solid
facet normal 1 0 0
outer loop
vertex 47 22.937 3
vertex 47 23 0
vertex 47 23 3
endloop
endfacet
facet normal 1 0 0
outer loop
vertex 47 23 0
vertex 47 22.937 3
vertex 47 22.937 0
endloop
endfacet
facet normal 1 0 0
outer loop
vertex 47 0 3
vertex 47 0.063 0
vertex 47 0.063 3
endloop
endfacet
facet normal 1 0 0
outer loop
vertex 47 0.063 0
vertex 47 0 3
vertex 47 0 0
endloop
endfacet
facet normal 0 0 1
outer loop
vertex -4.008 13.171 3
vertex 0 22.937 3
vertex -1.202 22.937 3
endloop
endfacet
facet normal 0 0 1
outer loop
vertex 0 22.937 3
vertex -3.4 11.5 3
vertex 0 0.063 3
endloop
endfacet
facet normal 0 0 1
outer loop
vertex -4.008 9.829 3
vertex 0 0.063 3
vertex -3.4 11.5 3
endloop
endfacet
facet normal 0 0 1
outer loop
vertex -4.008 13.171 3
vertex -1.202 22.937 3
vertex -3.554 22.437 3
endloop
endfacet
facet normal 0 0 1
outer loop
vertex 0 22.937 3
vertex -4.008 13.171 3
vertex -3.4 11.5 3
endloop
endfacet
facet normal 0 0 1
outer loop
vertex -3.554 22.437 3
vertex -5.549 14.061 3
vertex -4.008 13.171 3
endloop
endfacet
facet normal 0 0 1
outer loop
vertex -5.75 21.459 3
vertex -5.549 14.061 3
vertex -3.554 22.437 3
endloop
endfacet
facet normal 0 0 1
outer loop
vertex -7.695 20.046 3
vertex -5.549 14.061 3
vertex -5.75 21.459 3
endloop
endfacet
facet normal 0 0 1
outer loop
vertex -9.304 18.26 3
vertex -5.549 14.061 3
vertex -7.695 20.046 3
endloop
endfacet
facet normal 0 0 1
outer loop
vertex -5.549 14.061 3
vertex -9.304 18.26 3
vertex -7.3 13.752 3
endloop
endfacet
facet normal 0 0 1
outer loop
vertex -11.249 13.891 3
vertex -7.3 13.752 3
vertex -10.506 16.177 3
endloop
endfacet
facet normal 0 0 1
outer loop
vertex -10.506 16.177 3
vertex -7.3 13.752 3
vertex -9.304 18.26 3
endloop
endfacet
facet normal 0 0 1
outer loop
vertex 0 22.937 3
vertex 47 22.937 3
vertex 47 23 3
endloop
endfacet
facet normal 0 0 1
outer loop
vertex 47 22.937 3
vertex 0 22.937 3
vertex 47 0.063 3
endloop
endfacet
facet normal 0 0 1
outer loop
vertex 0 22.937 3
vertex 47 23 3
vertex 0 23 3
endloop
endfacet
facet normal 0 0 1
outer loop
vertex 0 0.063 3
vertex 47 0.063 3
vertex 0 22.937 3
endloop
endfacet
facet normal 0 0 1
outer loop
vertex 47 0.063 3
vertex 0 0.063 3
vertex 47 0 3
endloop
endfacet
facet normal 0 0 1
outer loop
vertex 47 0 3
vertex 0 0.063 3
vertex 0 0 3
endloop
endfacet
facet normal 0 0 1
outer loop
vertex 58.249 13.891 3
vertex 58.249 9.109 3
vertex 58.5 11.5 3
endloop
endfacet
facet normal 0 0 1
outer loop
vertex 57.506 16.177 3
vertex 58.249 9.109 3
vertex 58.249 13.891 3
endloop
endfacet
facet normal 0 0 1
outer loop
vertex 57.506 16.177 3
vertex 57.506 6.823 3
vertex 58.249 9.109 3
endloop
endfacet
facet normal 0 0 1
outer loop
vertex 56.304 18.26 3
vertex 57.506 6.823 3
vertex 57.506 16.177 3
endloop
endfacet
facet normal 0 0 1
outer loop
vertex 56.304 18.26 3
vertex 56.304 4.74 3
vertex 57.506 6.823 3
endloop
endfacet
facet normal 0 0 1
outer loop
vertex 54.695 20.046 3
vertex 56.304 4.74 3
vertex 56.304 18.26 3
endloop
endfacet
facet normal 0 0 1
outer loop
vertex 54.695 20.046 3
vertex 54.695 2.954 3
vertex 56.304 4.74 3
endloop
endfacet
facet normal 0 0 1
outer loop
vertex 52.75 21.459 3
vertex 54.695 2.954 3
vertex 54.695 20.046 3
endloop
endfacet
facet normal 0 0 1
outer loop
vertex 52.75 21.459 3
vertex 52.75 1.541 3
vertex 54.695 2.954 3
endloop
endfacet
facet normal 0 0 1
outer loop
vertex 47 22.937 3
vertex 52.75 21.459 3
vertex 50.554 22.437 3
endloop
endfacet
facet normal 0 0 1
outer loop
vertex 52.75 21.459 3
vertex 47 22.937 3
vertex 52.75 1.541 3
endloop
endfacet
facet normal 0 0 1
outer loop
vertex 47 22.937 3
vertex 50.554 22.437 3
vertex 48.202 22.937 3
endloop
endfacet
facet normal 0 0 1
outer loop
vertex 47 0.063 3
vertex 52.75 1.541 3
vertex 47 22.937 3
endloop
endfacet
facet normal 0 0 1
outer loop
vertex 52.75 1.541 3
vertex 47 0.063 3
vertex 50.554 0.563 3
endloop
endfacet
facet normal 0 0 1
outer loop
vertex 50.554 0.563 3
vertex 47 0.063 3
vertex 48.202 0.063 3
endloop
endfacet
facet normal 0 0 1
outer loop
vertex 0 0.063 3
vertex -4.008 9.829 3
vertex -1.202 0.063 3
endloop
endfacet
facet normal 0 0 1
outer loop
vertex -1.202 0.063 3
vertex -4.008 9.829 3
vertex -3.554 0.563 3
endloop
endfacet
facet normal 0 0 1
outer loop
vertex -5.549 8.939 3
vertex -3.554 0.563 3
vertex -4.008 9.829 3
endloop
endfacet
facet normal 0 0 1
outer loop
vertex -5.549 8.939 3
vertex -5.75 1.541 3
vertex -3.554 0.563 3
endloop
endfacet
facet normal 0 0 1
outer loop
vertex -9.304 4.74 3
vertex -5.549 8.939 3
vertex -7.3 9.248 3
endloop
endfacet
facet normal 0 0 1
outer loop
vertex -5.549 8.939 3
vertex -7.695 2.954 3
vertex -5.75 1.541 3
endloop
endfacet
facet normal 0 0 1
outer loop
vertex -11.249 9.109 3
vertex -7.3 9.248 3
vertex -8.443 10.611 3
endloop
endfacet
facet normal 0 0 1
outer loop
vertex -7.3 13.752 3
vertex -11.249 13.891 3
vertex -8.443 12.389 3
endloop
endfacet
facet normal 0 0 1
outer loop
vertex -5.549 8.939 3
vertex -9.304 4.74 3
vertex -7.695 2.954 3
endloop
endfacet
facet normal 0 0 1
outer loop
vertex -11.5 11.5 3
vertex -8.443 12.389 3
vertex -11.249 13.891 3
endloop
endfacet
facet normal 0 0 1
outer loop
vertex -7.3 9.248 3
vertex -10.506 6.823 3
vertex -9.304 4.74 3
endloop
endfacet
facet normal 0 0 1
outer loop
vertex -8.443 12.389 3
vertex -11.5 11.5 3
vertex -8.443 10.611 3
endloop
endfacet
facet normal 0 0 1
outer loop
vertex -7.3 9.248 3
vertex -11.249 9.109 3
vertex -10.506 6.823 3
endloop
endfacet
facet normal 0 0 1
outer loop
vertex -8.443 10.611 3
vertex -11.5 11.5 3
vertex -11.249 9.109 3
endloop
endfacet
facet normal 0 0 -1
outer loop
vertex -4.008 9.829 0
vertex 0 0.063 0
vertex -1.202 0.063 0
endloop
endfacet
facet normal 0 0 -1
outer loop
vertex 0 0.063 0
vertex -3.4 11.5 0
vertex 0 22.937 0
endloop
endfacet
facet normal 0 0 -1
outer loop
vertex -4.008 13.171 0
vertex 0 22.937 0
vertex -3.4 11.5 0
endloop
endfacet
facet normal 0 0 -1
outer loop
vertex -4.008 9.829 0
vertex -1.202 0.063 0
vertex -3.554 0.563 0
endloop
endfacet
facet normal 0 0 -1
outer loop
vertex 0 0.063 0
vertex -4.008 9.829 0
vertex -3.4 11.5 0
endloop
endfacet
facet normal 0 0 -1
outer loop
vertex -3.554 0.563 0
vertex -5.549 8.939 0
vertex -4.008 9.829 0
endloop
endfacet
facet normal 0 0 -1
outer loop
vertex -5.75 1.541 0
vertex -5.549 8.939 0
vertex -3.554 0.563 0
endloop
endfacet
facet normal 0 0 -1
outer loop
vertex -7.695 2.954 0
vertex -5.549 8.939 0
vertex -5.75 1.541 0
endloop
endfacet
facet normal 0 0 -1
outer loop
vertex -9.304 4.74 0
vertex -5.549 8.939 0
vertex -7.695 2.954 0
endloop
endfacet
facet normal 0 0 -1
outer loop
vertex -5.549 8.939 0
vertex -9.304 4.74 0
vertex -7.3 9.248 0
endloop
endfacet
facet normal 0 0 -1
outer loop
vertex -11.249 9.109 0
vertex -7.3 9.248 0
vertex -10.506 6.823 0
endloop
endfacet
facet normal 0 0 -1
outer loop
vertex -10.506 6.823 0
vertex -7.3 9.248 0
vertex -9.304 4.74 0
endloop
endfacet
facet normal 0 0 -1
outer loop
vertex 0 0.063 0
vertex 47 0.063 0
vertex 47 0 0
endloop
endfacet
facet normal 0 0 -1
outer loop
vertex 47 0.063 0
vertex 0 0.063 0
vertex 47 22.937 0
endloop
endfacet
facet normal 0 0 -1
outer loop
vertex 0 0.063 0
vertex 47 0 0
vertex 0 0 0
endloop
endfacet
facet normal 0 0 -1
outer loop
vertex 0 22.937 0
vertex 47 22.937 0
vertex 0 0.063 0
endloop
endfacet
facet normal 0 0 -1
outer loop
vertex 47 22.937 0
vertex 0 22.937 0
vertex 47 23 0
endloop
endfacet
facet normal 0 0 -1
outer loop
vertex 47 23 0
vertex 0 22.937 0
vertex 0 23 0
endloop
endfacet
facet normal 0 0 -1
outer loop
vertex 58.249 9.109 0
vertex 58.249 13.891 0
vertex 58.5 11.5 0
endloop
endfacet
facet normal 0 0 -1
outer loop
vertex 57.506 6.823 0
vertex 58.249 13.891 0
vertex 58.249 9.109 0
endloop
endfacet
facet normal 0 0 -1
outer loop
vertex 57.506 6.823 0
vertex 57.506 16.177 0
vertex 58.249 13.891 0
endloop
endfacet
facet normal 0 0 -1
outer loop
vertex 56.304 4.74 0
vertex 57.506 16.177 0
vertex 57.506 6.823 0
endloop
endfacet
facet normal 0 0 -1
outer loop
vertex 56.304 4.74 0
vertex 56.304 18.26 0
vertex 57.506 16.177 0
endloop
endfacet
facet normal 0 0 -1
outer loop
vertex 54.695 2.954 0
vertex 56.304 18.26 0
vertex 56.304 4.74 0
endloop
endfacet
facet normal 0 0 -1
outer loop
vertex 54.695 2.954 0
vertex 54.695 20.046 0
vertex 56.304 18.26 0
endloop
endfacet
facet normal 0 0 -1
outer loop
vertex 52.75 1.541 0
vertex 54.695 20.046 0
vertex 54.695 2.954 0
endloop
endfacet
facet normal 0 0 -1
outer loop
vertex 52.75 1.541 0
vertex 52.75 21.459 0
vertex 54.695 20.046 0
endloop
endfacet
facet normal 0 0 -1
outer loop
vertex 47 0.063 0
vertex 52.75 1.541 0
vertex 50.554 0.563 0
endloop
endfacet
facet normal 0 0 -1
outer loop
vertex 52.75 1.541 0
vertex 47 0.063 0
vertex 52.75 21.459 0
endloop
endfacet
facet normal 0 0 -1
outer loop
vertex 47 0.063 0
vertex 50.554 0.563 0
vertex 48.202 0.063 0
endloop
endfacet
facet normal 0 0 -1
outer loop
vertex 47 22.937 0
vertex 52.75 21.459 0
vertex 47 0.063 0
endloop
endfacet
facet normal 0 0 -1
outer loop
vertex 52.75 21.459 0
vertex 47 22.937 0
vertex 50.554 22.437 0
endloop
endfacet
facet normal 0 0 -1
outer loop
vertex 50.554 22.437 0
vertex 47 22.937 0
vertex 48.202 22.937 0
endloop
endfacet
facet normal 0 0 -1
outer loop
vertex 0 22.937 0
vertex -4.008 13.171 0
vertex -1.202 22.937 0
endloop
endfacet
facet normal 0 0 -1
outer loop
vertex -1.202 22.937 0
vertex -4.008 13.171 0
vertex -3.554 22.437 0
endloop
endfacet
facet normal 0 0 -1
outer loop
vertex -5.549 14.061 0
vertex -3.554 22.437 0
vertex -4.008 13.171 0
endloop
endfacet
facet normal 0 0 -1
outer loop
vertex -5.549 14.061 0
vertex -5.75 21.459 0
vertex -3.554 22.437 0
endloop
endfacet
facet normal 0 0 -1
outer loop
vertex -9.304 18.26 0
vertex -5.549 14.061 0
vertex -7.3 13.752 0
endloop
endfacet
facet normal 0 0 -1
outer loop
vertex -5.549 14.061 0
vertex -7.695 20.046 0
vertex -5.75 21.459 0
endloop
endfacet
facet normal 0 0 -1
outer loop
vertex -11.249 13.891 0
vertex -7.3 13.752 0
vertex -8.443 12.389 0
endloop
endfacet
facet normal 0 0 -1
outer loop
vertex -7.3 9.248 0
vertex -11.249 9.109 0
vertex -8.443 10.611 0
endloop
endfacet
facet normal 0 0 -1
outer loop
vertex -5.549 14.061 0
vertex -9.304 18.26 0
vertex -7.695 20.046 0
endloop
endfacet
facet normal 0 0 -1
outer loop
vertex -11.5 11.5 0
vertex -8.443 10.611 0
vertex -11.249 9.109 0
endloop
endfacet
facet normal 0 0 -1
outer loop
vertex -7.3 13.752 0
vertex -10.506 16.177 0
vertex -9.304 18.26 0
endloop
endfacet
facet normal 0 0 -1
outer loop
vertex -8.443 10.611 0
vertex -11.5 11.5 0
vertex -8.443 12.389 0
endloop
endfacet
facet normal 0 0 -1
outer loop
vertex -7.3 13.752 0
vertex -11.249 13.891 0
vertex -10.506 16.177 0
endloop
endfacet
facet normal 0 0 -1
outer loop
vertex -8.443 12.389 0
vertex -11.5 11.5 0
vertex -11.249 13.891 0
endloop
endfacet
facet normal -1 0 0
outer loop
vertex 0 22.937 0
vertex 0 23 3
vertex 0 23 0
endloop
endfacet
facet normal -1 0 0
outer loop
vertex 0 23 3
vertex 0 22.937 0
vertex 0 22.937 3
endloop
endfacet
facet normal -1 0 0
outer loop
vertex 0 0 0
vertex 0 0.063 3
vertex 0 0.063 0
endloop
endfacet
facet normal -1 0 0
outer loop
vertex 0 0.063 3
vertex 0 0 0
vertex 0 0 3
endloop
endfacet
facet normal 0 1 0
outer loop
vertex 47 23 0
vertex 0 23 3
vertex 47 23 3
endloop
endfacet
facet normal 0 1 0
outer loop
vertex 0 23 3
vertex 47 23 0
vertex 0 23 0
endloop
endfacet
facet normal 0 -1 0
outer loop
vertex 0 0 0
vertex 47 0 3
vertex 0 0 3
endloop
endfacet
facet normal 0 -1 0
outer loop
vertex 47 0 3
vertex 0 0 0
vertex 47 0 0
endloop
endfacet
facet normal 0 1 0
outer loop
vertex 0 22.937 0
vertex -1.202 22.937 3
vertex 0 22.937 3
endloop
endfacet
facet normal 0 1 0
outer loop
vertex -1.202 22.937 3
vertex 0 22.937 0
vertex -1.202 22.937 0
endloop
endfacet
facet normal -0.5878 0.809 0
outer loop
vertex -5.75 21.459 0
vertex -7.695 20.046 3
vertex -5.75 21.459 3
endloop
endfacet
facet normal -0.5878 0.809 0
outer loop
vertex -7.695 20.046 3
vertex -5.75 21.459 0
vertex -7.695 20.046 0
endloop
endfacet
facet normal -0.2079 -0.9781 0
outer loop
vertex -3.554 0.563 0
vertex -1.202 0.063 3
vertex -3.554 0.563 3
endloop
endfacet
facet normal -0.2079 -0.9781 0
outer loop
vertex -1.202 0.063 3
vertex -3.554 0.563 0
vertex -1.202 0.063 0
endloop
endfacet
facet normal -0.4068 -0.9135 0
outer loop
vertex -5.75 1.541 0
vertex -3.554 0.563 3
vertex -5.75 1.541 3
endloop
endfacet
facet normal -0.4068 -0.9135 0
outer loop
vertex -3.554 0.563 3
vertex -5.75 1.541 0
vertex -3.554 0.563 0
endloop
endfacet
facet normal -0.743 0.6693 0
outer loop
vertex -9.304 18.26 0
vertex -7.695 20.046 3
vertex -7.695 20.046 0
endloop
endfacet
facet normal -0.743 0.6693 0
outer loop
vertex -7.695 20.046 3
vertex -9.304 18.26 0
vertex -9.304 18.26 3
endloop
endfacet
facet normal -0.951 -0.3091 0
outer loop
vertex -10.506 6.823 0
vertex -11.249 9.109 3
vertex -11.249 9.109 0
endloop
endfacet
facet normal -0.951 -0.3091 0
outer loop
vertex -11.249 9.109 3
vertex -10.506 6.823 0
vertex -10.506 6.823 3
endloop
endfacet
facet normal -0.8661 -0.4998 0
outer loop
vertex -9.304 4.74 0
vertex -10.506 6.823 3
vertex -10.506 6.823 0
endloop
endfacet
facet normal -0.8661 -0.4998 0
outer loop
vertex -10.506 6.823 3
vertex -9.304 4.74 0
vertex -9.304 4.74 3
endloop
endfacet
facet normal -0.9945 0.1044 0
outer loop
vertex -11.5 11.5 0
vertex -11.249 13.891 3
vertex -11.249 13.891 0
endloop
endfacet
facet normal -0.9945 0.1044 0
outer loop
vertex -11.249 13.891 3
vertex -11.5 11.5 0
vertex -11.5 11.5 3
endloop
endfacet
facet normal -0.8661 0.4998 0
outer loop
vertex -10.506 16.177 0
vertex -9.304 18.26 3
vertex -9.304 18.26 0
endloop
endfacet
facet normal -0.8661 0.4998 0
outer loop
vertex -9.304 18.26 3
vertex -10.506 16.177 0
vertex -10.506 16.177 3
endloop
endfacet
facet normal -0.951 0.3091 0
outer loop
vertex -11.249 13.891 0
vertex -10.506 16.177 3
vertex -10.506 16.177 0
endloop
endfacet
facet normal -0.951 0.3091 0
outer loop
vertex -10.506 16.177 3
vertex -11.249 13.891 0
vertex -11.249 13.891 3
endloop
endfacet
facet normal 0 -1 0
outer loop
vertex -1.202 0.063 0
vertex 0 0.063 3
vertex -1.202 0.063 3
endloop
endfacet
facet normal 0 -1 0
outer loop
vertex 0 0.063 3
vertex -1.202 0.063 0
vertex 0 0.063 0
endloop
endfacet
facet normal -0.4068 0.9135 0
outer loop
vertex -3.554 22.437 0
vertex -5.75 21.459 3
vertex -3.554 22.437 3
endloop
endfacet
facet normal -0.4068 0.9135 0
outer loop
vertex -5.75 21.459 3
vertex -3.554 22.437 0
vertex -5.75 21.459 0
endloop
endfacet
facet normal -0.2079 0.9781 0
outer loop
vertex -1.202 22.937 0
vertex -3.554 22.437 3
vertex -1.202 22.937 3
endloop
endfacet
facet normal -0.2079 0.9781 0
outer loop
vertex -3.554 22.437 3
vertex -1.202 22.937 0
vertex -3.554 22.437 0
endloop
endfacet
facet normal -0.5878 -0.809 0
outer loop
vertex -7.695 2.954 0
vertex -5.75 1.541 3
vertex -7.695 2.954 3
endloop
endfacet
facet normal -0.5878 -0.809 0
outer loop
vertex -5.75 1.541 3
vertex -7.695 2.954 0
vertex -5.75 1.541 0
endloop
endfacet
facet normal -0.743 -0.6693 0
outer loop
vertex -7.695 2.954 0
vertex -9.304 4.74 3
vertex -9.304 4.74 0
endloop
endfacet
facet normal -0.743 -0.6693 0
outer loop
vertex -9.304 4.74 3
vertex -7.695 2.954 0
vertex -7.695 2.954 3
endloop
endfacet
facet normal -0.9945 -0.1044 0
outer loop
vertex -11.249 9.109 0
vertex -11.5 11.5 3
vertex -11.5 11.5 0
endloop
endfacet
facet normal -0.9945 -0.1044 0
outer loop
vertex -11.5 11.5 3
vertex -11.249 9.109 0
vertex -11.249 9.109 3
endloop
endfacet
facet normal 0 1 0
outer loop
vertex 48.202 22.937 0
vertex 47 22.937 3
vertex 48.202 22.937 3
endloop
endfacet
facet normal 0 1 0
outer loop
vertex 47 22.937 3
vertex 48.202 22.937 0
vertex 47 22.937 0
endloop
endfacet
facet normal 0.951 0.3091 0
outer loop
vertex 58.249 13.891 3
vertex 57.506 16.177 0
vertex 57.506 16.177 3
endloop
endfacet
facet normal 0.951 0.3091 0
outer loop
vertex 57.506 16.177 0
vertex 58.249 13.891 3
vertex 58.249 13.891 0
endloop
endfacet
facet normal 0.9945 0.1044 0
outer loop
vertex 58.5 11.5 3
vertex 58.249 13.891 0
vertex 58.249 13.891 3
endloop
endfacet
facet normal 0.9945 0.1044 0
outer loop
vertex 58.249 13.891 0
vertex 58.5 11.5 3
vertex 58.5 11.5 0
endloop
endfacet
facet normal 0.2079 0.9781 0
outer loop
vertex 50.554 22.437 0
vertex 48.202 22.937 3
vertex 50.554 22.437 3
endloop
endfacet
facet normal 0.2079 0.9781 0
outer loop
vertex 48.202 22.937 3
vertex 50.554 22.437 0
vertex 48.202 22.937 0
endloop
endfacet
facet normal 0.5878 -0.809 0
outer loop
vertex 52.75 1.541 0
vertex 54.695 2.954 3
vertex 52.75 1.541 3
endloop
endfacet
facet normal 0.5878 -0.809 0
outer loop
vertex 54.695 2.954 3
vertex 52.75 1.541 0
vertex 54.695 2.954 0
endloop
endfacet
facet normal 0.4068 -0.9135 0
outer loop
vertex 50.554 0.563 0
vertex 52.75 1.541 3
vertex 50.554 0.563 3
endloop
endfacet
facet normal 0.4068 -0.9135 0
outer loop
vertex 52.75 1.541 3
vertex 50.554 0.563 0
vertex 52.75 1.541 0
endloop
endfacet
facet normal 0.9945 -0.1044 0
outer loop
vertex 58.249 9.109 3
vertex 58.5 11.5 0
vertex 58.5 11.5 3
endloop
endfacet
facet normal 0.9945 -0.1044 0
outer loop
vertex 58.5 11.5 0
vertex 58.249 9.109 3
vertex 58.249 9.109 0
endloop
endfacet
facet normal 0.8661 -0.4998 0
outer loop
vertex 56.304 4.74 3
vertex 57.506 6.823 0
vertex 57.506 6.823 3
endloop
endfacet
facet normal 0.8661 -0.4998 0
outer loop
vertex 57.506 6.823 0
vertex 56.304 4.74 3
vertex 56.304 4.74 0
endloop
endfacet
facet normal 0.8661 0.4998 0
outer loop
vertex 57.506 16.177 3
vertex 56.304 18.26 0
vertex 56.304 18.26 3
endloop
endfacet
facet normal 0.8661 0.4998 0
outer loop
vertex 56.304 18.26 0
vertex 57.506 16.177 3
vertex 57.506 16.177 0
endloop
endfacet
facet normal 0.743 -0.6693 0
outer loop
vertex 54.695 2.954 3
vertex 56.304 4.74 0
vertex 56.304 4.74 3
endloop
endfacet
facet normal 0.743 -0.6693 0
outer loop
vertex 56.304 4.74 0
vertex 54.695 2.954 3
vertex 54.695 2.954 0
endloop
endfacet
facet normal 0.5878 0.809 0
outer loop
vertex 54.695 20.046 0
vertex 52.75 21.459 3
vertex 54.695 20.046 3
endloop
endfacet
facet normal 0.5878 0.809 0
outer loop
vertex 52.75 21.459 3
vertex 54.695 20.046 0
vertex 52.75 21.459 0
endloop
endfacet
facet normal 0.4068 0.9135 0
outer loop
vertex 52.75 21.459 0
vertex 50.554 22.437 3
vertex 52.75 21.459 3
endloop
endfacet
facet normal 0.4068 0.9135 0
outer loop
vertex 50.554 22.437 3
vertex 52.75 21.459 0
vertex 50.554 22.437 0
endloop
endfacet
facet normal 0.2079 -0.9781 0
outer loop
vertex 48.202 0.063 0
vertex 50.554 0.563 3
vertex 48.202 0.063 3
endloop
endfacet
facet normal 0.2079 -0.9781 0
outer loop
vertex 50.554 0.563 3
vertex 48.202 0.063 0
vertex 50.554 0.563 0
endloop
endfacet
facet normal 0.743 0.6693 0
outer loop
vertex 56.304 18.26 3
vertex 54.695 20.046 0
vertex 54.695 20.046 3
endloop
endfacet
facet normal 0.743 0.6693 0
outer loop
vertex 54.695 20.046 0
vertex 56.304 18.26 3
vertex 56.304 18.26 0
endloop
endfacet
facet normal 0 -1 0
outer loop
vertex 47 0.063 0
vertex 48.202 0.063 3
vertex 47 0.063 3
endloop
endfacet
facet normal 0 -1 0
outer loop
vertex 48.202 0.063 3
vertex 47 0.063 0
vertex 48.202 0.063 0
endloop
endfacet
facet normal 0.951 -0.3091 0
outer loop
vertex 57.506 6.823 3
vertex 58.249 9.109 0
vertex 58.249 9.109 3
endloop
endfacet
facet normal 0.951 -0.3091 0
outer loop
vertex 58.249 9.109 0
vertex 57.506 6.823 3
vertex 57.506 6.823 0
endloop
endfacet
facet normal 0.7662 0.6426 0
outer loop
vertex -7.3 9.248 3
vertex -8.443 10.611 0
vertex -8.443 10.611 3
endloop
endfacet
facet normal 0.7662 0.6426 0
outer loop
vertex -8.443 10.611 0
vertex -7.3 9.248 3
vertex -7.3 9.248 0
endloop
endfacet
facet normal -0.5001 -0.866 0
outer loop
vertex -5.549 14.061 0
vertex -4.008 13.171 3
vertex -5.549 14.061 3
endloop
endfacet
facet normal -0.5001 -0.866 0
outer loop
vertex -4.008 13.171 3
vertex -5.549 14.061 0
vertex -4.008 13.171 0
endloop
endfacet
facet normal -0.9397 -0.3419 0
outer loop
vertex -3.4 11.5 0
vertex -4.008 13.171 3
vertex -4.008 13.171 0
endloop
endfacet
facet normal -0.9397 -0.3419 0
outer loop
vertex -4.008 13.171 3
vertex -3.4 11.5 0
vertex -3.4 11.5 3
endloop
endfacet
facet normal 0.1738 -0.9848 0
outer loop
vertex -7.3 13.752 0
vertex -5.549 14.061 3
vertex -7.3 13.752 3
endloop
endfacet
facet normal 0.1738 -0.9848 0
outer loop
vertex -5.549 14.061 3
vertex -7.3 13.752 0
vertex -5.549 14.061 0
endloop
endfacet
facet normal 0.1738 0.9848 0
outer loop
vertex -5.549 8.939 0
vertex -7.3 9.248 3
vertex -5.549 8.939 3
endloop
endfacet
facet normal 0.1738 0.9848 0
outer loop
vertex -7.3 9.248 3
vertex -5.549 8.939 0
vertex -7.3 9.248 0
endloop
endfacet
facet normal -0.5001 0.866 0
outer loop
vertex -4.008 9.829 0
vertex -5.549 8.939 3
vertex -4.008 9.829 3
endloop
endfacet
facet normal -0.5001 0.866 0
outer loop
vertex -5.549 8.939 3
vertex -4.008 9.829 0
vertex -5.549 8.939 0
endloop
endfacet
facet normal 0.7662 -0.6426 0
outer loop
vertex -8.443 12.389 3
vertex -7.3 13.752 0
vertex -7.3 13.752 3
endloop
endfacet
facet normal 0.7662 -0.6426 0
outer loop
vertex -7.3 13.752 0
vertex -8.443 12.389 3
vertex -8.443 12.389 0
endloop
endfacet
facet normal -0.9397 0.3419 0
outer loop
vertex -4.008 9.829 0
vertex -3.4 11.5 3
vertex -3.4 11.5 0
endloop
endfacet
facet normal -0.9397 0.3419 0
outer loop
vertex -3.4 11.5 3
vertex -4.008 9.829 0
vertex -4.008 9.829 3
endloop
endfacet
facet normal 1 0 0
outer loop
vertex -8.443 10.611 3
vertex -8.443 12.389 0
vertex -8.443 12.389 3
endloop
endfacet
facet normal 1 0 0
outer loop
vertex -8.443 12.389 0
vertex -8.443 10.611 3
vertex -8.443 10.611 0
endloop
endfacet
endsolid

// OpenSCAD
logo = "your_logo.png"; //set your logo file name
logo_x = 420; // width of the logo image in pixels
logo_y = 74; // height of the logo image in pixels

tolerance = 0.2;
left_keychain_hole_size = 5; // left hole size in mm for the keychain ring
right_keychain_hole_size = 0; // right hole size in mm for the keychain ring
size_x = 70; // width of the keychain tag in mm
size_y = 23; // height of the keychain tag in mm
size_z = 3; // thickness of the keychain tag in mm
x_gap = 3; // mm between the logo and the left/right border
y_gap = 3; // mm between the logo and the top/bottom border

function GetLeftGap() = left_keychain_hole_size > 0 ? left_keychain_hole_size + x_gap * 2 : x_gap;
function GetRightGap() = right_keychain_hole_size > 0 ? right_keychain_hole_size + x_gap * 2 : x_gap;

cube_size_x = size_x - size_y;
left_gap = GetLeftGap();
right_gap = GetRightGap();
image_size_x = size_x - left_gap - right_gap;
scale_factor = image_size_x / logo_x;
image_size_y = scale_factor * logo_y;

difference()
{
    union()
    {
        cube([cube_size_x, size_y, size_z]);
        translate([0, size_y / 2, 0]) 
            cylinder(h = size_z, r = size_y / 2);
        translate([cube_size_x, size_y / 2, 0]) 
            cylinder(h = size_z, r = size_y / 2);
    }
    translate([left_gap - size_y / 2, image_size_y - y_gap, size_z]) 
        scale([scale_factor, scale_factor, size_z / 100]) 
        surface(file = logo, invert = true); 
    if (left_keychain_hole_size > 0)
    {
        translate([0 - size_y / 2 + 3 + left_keychain_hole_size / 2, size_y / 2, 0])
            cylinder(h = size_z, r = (left_keychain_hole_size + tolerance) / 2);
    }
    if (right_keychain_hole_size > 0)
    {
        translate([cube_size_x + size_y / 2 - 3 - right_keychain_hole_size / 2, size_y / 2, 0]) 
            cylinder(h = size_z, r = (right_keychain_hole_size + tolerance) / 2);
    }
}
